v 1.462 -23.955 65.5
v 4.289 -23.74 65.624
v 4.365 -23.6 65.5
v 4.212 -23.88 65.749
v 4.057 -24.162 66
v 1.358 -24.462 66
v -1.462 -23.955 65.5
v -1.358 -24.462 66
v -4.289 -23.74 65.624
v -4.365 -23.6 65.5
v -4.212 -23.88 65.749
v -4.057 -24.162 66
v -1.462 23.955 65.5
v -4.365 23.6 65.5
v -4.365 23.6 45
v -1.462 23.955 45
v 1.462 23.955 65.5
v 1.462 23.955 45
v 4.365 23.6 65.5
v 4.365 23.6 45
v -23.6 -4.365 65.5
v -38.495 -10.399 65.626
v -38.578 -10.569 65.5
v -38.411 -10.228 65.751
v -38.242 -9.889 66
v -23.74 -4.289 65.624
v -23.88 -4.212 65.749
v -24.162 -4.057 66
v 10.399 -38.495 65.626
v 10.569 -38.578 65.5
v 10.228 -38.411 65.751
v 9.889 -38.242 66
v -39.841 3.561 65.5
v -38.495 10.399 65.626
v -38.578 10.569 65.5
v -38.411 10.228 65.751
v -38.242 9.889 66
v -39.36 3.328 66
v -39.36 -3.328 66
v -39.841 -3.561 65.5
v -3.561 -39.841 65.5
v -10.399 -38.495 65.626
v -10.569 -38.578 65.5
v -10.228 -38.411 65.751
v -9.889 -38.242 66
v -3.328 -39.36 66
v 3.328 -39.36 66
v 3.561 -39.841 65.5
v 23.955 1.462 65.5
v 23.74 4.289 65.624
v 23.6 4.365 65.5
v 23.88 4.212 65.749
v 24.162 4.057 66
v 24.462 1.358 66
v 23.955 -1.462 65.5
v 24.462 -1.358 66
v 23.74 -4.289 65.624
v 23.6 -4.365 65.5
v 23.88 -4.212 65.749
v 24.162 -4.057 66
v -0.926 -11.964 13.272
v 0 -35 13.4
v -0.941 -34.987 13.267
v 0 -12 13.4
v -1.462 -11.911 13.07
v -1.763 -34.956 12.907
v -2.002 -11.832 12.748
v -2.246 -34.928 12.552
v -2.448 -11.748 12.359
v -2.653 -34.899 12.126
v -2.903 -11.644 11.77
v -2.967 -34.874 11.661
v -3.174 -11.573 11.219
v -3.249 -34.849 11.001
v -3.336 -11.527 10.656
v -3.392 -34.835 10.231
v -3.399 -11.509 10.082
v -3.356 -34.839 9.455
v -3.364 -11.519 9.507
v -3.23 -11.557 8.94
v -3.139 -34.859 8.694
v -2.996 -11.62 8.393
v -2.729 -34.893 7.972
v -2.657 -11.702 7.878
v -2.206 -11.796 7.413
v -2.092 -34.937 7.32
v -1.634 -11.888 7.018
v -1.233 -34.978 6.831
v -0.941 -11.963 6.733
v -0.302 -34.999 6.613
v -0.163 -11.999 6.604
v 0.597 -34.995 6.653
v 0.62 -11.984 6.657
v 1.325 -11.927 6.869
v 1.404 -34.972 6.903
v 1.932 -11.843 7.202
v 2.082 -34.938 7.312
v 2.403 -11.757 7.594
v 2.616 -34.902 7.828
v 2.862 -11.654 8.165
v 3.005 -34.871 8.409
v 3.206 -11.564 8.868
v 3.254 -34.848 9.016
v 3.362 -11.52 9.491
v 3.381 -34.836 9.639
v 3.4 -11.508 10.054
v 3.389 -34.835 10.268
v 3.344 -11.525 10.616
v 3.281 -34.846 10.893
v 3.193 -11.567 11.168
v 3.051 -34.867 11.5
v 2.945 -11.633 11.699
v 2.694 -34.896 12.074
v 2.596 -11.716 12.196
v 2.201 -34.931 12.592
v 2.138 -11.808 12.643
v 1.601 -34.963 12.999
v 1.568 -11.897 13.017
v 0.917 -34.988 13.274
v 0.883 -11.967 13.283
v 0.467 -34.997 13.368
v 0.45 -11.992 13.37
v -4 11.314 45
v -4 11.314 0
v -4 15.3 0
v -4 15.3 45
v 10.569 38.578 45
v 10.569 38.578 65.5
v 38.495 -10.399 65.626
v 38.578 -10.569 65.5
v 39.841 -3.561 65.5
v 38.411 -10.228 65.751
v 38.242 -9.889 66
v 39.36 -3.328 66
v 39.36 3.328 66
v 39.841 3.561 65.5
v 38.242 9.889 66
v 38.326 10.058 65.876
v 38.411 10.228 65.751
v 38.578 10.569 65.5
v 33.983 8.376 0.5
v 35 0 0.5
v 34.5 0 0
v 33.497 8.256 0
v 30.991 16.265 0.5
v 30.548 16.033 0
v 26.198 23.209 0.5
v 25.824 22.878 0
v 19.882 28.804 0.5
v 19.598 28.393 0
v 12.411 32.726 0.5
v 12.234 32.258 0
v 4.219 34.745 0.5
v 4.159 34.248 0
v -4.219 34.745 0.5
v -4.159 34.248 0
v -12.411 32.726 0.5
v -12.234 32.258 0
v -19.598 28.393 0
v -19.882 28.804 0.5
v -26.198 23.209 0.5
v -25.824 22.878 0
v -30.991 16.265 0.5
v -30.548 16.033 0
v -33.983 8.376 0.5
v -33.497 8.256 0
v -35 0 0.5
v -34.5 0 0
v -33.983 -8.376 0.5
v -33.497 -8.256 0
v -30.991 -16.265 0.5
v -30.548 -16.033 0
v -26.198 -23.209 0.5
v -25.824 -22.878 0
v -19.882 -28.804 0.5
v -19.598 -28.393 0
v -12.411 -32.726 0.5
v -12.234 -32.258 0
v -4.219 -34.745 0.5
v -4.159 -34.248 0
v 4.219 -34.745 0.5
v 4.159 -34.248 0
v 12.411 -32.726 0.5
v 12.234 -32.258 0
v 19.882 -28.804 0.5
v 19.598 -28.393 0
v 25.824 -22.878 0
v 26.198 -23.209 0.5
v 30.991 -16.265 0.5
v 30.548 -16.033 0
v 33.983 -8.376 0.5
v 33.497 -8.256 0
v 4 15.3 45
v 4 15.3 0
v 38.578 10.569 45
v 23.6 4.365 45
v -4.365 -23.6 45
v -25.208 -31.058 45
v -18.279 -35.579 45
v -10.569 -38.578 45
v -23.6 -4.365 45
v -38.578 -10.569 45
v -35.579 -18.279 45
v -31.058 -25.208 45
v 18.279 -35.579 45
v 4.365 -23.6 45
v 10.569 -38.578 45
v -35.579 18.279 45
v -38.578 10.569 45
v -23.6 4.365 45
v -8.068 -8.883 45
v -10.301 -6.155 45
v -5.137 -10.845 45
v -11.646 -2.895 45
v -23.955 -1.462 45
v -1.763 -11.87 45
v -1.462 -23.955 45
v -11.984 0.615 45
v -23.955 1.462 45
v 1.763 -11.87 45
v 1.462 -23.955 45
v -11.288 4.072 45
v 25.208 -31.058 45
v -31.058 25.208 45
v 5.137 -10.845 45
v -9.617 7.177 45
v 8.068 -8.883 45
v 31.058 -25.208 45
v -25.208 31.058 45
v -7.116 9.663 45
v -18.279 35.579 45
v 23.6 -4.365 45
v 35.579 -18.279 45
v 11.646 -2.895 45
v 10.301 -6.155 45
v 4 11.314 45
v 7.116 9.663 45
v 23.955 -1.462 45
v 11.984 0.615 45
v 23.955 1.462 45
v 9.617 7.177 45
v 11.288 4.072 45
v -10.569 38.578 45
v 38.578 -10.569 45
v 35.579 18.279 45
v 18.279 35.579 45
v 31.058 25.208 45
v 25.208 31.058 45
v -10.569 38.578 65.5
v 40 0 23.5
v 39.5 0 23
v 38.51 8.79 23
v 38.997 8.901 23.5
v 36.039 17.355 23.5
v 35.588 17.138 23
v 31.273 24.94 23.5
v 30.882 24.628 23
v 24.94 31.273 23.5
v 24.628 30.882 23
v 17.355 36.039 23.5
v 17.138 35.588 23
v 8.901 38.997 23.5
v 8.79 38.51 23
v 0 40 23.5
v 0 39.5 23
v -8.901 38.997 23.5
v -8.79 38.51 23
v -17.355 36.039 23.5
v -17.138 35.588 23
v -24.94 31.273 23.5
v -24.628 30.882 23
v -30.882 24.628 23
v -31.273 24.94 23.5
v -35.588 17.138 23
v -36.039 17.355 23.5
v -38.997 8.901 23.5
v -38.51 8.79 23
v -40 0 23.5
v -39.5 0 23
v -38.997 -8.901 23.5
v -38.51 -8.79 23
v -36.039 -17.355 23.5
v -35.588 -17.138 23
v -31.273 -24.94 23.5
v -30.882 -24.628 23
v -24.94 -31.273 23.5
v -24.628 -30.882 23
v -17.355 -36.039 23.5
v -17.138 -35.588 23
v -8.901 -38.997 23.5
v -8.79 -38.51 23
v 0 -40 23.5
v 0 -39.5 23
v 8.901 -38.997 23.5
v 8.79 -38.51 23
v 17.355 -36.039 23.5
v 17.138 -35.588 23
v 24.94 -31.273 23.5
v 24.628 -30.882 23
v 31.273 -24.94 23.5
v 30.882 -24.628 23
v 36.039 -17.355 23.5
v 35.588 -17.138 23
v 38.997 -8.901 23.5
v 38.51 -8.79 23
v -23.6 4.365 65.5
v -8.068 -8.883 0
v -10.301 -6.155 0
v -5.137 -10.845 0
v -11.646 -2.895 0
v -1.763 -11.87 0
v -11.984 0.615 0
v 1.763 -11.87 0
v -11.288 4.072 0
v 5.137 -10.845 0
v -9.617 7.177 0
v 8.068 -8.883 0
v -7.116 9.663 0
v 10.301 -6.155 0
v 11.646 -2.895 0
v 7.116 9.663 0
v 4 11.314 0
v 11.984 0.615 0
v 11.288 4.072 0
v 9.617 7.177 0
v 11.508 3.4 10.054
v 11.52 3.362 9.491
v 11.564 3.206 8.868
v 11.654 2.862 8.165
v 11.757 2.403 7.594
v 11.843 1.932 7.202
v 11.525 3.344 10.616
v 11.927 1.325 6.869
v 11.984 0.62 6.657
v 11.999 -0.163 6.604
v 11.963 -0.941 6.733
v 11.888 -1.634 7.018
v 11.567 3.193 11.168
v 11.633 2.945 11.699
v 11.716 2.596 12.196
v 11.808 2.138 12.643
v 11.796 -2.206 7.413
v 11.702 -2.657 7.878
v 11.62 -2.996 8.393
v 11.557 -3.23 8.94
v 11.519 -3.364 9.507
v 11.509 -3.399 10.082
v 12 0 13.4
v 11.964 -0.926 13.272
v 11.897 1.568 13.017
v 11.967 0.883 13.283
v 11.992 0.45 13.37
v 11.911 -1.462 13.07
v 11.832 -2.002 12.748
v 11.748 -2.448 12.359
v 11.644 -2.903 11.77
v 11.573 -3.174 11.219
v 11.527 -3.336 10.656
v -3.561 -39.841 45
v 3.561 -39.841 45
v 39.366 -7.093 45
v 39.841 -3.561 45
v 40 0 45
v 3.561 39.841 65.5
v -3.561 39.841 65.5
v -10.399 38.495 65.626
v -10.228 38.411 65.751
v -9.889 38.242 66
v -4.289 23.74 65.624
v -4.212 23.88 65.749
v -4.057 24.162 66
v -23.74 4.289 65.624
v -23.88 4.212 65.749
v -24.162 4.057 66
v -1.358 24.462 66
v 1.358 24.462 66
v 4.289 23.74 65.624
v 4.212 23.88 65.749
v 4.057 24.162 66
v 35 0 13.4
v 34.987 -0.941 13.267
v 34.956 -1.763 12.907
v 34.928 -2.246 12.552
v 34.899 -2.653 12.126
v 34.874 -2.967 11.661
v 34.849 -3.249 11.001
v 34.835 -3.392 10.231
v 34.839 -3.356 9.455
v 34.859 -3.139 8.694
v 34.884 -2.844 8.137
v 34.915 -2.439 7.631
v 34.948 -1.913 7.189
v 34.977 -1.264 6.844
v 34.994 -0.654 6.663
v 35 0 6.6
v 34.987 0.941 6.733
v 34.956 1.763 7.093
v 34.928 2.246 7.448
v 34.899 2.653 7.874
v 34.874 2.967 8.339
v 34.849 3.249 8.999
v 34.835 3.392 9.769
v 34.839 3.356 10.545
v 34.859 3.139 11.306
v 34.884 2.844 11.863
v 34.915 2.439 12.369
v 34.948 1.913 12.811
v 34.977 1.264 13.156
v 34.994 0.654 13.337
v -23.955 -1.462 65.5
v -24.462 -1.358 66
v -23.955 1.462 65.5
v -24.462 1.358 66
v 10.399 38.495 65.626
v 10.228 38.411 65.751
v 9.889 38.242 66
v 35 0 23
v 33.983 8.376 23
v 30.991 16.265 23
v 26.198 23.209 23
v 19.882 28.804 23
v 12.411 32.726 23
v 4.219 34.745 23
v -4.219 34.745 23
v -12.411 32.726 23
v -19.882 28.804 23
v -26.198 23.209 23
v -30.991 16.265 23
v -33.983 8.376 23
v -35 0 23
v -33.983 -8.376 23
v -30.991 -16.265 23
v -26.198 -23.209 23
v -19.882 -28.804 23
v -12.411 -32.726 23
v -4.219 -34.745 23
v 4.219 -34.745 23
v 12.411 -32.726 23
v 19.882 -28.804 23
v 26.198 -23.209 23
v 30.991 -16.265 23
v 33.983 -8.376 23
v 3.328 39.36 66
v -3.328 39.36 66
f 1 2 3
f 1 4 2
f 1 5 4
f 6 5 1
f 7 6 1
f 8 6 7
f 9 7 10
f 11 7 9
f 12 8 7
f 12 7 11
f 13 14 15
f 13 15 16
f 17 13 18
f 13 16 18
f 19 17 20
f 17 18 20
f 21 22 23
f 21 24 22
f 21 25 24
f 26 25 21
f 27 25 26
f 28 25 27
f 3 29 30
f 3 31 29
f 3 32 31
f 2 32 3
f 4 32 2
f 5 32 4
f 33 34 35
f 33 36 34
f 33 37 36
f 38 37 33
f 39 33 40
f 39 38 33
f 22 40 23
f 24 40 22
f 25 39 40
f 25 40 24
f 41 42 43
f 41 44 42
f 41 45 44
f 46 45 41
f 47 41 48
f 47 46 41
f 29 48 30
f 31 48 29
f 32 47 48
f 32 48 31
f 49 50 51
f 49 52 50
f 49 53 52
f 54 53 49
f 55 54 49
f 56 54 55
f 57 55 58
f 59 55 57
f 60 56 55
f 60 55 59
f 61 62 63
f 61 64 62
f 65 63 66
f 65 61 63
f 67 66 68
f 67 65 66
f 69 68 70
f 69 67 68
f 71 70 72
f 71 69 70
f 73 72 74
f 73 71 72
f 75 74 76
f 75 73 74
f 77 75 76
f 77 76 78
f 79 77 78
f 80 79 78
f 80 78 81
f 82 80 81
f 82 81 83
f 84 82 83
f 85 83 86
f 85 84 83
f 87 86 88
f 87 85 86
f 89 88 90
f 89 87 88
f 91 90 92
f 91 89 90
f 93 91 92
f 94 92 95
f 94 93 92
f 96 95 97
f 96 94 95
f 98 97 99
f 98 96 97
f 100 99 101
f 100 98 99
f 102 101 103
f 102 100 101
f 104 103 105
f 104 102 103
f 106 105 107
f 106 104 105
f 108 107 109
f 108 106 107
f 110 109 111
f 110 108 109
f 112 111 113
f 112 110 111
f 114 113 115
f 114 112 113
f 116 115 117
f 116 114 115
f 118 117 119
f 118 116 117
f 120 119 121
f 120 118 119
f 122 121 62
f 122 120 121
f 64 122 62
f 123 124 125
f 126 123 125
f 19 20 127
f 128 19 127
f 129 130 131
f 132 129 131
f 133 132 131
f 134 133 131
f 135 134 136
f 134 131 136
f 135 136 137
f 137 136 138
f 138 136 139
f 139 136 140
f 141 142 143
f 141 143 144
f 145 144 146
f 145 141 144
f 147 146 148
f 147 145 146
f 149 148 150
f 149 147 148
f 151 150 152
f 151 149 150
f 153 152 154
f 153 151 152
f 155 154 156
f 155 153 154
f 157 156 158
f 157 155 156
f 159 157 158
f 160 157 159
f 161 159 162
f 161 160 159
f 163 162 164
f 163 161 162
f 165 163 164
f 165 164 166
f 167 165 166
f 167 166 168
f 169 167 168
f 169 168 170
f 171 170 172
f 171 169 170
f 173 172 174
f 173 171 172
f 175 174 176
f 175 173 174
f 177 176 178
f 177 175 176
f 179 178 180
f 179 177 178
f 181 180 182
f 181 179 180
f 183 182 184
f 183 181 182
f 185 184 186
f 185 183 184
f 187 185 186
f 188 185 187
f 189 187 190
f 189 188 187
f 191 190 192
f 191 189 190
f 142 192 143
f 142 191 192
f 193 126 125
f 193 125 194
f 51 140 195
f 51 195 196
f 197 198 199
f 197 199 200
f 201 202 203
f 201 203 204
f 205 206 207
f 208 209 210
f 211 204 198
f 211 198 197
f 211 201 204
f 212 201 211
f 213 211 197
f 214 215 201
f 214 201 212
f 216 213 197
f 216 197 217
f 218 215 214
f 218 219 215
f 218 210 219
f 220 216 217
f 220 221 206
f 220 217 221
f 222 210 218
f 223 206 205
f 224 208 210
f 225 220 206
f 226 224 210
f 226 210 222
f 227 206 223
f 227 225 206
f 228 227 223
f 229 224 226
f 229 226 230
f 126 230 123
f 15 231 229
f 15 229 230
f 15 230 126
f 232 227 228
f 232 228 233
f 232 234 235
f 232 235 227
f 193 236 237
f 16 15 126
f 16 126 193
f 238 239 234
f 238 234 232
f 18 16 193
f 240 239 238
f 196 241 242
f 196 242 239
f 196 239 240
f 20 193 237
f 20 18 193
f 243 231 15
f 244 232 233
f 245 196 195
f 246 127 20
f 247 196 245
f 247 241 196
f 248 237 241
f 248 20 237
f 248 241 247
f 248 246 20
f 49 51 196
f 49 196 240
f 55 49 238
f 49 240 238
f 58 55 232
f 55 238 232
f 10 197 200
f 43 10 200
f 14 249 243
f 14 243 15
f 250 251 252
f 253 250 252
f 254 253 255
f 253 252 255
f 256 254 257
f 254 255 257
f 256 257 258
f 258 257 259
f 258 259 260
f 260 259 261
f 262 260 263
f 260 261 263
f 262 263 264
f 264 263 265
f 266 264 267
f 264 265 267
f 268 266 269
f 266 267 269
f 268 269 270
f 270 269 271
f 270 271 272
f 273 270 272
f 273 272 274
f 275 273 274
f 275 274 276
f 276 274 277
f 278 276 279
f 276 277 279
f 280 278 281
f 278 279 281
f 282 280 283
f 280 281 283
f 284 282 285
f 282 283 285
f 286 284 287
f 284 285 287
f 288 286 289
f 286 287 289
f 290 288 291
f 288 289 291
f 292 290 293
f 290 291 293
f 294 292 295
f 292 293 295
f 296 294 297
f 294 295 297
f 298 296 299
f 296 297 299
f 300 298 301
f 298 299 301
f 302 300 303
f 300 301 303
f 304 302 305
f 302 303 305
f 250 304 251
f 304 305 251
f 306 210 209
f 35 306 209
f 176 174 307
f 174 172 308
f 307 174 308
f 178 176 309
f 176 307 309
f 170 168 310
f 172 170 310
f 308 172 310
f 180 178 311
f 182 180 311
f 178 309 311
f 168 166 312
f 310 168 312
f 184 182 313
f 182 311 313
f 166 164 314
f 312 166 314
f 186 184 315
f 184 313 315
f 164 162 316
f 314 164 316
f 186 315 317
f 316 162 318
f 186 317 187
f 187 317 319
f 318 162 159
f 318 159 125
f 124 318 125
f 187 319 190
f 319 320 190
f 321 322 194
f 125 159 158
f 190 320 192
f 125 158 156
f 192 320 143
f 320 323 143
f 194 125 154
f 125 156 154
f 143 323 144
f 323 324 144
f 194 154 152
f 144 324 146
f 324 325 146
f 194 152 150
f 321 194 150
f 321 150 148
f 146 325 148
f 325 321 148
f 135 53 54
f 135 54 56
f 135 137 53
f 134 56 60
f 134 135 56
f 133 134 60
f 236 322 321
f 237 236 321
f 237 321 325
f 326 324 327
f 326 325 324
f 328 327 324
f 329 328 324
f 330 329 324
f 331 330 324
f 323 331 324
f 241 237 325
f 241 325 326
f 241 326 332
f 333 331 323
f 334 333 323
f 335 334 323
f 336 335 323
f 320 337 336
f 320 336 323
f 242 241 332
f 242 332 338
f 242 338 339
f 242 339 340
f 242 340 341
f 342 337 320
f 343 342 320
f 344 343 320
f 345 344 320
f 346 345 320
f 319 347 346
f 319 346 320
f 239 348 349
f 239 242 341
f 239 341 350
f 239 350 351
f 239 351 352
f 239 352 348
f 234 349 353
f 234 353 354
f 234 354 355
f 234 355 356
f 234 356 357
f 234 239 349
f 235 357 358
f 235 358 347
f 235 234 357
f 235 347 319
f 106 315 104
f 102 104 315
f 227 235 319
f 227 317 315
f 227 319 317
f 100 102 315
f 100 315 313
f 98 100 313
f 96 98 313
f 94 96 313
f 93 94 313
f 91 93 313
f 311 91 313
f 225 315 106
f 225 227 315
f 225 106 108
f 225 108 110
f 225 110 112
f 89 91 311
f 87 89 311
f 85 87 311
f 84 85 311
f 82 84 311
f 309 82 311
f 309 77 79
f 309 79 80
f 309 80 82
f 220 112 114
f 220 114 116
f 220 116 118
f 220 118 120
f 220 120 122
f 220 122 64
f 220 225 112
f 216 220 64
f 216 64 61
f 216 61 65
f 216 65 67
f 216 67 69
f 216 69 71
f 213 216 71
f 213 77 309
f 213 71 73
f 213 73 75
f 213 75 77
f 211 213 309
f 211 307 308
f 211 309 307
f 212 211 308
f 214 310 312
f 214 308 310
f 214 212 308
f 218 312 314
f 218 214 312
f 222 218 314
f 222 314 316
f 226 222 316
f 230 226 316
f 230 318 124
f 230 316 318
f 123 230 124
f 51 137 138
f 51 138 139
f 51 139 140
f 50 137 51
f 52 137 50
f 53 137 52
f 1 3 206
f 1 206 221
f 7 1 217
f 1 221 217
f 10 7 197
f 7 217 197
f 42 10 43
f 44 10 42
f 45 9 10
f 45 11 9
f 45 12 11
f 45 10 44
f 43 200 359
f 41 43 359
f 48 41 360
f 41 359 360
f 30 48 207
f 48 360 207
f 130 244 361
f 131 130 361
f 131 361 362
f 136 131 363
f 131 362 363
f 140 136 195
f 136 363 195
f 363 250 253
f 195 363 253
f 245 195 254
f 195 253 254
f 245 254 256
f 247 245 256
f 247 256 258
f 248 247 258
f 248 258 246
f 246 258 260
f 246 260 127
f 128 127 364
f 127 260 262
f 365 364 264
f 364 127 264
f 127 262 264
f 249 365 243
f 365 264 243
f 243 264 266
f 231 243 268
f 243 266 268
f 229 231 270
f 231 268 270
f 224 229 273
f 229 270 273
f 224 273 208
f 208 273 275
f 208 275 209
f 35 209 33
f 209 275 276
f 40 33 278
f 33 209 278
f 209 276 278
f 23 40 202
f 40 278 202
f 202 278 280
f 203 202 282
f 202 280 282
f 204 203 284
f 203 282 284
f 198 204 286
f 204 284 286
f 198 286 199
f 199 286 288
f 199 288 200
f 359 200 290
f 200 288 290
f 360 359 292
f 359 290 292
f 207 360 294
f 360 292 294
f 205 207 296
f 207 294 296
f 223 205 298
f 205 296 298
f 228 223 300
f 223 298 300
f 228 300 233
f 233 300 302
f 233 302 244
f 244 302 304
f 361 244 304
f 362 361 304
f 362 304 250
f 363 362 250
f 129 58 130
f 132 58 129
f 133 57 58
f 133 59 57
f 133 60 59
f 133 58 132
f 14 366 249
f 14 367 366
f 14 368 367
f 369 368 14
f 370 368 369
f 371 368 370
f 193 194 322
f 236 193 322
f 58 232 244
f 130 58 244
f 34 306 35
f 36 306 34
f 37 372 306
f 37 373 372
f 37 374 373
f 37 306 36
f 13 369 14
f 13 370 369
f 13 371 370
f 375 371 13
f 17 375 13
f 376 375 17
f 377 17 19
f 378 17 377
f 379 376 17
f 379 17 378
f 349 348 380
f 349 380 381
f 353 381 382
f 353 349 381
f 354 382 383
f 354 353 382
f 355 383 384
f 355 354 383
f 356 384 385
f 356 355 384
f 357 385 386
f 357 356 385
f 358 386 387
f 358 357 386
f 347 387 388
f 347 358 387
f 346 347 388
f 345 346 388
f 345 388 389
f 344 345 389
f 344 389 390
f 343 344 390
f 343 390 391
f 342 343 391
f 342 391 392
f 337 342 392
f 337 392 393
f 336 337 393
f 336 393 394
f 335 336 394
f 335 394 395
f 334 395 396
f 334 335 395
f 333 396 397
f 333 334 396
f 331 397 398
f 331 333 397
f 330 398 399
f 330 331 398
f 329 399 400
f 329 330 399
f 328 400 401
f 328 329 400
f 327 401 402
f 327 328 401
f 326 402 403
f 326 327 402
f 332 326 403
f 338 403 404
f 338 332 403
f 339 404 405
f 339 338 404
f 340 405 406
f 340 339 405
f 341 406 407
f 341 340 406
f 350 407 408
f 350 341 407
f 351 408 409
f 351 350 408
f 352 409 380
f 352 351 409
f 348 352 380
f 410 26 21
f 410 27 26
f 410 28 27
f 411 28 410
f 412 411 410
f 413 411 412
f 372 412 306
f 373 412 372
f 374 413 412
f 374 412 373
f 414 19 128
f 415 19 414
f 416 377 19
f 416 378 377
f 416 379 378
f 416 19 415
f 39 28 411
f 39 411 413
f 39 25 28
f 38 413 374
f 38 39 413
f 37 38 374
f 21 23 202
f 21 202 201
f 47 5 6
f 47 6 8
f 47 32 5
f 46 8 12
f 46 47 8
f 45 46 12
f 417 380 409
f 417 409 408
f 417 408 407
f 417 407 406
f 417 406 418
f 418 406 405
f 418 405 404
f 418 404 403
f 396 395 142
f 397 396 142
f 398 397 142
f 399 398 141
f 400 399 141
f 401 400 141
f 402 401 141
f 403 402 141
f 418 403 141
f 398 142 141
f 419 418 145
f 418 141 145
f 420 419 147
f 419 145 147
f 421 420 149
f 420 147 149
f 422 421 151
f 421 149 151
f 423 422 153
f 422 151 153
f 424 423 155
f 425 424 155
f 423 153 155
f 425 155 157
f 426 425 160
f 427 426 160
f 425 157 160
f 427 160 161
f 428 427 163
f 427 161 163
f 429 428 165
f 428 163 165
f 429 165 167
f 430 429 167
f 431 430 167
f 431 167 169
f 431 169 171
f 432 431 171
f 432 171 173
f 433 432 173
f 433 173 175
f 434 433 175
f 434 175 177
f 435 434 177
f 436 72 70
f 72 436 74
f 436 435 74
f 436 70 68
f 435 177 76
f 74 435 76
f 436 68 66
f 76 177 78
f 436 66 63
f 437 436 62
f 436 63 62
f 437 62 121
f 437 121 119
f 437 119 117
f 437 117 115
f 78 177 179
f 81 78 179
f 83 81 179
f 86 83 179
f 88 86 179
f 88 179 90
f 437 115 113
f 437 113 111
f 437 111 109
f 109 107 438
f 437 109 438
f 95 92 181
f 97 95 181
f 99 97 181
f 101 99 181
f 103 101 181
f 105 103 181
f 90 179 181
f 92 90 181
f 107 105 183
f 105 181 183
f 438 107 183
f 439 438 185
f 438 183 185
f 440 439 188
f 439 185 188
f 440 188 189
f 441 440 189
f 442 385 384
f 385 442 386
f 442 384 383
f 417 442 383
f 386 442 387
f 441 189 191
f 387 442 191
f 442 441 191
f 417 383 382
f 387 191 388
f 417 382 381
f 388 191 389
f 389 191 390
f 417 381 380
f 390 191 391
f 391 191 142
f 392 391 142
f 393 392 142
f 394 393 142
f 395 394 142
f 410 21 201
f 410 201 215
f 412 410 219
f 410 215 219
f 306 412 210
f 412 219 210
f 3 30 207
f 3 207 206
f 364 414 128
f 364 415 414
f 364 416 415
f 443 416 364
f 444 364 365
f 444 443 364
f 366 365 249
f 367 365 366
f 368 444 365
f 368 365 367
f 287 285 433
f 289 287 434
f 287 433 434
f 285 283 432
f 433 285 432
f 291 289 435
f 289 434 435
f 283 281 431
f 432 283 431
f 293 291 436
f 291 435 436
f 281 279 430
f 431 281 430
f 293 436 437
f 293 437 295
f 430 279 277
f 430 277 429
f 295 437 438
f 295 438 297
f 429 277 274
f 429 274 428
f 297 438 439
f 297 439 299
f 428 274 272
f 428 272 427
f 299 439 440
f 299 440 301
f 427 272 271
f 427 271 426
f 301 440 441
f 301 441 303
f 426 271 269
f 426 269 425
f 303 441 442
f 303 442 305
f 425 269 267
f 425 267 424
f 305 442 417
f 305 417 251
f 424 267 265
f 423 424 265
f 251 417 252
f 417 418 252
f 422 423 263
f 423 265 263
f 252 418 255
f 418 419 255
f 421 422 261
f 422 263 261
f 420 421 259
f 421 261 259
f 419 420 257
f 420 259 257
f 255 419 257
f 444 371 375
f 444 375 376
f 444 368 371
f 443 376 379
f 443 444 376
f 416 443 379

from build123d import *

# Parameters (mm, degrees)
SKETCH1_R                    = 35
BOSS_EXTRUDE1_DEPTH          = 23
SKETCH2_R                    = 40
BOSS_EXTRUDE2_DEPTH          = 22
BOSS_EXTRUDE3_DEPTH          = 21
CHAMFER1_SIZE                = 0.5
CIRPATTERN1_COUNT            = 4
CHAMFER1_OF_CIRPATTERN1_SIZE = 0.5
CUT_EXTRUDE1_REACH           = 74.284
CIRPATTERN2_COUNT            = 2
CIRPATTERN2_ANGLE            = 90.0000000000002
CHAMFER2_SIZE                = 0.5


with BuildPart() as part:
    # Sketch1 → Boss-Extrude1 (new body)
    with BuildSketch(Plane.XY):
        Circle(SKETCH1_R)
    extrude(amount=BOSS_EXTRUDE1_DEPTH)

    # Sketch2 → Boss-Extrude2 (add)
    with BuildSketch(Plane.XY.offset(23)):
        Circle(SKETCH2_R)
    extrude(amount=BOSS_EXTRUDE2_DEPTH)

    # Sketch3 → Boss-Extrude3 (add)
    with BuildSketch(Plane.XY.offset(45)):
        with BuildLine():
            ThreePointArc((-4.365000000000002, 23.599719807658737), (-2.1916574340201898, 23.89972045217065), (-3.535e-13, 24.000000000000004))
            Line((0, 24.000000000000004), (0, 40))
            ThreePointArc((2.45e-15, 40), (-5.332266542853259, 39.64299349842249), (-10.569350394509378, 38.578346675798386))
            Line((-10.569350394509376, 38.578346675798386), (-4.365000000000001, 23.599719807658737))
        make_face()
        with BuildLine():
            Line((0, 40), (0, 24.000000000000004))
            ThreePointArc((-3.535e-13, 24.000000000000004), (2.1916574340198385, 23.899720452170683), (4.365000000000001, 23.599719807658737))
            Line((4.365000000000001, 23.599719807658737), (10.569350394509376, 38.578346675798386))
            ThreePointArc((10.569350394509375, 38.578346675798386), (5.332266542853264, 39.64299349842249), (2.45e-15, 40))
        make_face()
    boss_extrude3 = extrude(amount=BOSS_EXTRUDE3_DEPTH)

    # Chamfer1
    chamfer1_edges = [part.edges().sort_by_distance(p)[0] for p in [
        (-2.22e-15, 24.000000000000007, 66),
        (7.467175197254688, 31.08903324172856, 66),
        (-5.11e-15, 40.000000000000014, 66),
        (-7.467175197254688, 31.08903324172856, 66),
    ]]
    chamfer(chamfer1_edges, length=CHAMFER1_SIZE)

    # CirPattern1: Boss-Extrude3 ×4 about axis
    cirpattern1_axis = Axis((-1e-15, 7.77e-15, 0), (0, 0, 1))
    for i in range(1, CIRPATTERN1_COUNT):
        add(boss_extrude3.rotate(cirpattern1_axis, i * 360 / CIRPATTERN1_COUNT))

    # Chamfer1 of CirPattern1
    chamfer1_of_cirpattern1_edges = [part.edges().sort_by_distance(p)[0] for p in [
        (-24, 8.02e-15, 66),
        (-31.089033241728554, 7.467175197254699, 66),
        (-40.00000000000001, 6.11e-15, 66),
        (-31.089033241728554, -7.467175197254678, 66),
        (-2.72e-15, -23.999999999999993, 66),
        (-7.467175197254694, -31.089033241728547, 66),
        (-1.79e-15, -40, 66),
        (7.467175197254683, -31.089033241728547, 66),
        (24, 4.58e-15, 66),
        (31.089033241728554, -7.4671751972546865, 66),
        (40.00000000000001, 4.52e-15, 66),
        (31.089033241728554, 7.46717519725469, 66),
    ]]
    chamfer(chamfer1_of_cirpattern1_edges, length=CHAMFER1_OF_CIRPATTERN1_SIZE)

    # Sketch4 → Cut-Extrude1 (cut, up to next)
    with BuildSketch(Plane.XY.offset(45), mode=Mode.PRIVATE) as cut_extrude1_sk1:
        with BuildLine():
            Line((-4, 11.31370849898476), (-4, 15.3))
            Line((-4, 15.3), (4, 15.3))
            Line((4, 15.3), (4, 11.31370849898476))
            ThreePointArc((4, 11.31370849898476), (-2.2e-15, -11.999999999999998), (-4, 11.31370849898476))
        make_face()
    cut_extrude1_tool1 = extrude(cut_extrude1_sk1.sketch, amount=-CUT_EXTRUDE1_REACH, mode=Mode.PRIVATE) & part.part
    add(cut_extrude1_tool1.solids().sort_by_distance((0, 0.794205, 45))[0], mode=Mode.SUBTRACT)

    # Sketch6 → M8x1.25 Tapped Hole1 (revolve, cut)
    with BuildSketch(Plane(origin=(0, 0, 10), x_dir=(0, 0, 1), z_dir=(0, 1, 0))):
        Polygon((0, 0), (-9.8e-15, 40), (3.39999999999999, 40), (3.399999999999995, 3.6e-16), align=None)
    m8x1_25_tapped_hole1 = revolve(axis=Axis((-6.349999999999991, 0, 10), (1, 0, 0)), mode=Mode.SUBTRACT)

    # CirPattern2: M8x1.25 Tapped Hole1 ×2 about axis
    cirpattern2_axis = Axis((0, 0, 0), (0, 0, -1))
    for i in range(1, CIRPATTERN2_COUNT):
        add(m8x1_25_tapped_hole1.rotate(cirpattern2_axis, i * CIRPATTERN2_ANGLE / (CIRPATTERN2_COUNT - 1)), mode=Mode.SUBTRACT)

    # Chamfer2
    chamfer2_edges = [part.edges().sort_by_distance(p)[0] for p in [
        (-35, 4.29e-15, 0),
        (-40, 4.9e-15, 23),
    ]]
    chamfer(chamfer2_edges, length=CHAMFER2_SIZE)


solid = part.part
